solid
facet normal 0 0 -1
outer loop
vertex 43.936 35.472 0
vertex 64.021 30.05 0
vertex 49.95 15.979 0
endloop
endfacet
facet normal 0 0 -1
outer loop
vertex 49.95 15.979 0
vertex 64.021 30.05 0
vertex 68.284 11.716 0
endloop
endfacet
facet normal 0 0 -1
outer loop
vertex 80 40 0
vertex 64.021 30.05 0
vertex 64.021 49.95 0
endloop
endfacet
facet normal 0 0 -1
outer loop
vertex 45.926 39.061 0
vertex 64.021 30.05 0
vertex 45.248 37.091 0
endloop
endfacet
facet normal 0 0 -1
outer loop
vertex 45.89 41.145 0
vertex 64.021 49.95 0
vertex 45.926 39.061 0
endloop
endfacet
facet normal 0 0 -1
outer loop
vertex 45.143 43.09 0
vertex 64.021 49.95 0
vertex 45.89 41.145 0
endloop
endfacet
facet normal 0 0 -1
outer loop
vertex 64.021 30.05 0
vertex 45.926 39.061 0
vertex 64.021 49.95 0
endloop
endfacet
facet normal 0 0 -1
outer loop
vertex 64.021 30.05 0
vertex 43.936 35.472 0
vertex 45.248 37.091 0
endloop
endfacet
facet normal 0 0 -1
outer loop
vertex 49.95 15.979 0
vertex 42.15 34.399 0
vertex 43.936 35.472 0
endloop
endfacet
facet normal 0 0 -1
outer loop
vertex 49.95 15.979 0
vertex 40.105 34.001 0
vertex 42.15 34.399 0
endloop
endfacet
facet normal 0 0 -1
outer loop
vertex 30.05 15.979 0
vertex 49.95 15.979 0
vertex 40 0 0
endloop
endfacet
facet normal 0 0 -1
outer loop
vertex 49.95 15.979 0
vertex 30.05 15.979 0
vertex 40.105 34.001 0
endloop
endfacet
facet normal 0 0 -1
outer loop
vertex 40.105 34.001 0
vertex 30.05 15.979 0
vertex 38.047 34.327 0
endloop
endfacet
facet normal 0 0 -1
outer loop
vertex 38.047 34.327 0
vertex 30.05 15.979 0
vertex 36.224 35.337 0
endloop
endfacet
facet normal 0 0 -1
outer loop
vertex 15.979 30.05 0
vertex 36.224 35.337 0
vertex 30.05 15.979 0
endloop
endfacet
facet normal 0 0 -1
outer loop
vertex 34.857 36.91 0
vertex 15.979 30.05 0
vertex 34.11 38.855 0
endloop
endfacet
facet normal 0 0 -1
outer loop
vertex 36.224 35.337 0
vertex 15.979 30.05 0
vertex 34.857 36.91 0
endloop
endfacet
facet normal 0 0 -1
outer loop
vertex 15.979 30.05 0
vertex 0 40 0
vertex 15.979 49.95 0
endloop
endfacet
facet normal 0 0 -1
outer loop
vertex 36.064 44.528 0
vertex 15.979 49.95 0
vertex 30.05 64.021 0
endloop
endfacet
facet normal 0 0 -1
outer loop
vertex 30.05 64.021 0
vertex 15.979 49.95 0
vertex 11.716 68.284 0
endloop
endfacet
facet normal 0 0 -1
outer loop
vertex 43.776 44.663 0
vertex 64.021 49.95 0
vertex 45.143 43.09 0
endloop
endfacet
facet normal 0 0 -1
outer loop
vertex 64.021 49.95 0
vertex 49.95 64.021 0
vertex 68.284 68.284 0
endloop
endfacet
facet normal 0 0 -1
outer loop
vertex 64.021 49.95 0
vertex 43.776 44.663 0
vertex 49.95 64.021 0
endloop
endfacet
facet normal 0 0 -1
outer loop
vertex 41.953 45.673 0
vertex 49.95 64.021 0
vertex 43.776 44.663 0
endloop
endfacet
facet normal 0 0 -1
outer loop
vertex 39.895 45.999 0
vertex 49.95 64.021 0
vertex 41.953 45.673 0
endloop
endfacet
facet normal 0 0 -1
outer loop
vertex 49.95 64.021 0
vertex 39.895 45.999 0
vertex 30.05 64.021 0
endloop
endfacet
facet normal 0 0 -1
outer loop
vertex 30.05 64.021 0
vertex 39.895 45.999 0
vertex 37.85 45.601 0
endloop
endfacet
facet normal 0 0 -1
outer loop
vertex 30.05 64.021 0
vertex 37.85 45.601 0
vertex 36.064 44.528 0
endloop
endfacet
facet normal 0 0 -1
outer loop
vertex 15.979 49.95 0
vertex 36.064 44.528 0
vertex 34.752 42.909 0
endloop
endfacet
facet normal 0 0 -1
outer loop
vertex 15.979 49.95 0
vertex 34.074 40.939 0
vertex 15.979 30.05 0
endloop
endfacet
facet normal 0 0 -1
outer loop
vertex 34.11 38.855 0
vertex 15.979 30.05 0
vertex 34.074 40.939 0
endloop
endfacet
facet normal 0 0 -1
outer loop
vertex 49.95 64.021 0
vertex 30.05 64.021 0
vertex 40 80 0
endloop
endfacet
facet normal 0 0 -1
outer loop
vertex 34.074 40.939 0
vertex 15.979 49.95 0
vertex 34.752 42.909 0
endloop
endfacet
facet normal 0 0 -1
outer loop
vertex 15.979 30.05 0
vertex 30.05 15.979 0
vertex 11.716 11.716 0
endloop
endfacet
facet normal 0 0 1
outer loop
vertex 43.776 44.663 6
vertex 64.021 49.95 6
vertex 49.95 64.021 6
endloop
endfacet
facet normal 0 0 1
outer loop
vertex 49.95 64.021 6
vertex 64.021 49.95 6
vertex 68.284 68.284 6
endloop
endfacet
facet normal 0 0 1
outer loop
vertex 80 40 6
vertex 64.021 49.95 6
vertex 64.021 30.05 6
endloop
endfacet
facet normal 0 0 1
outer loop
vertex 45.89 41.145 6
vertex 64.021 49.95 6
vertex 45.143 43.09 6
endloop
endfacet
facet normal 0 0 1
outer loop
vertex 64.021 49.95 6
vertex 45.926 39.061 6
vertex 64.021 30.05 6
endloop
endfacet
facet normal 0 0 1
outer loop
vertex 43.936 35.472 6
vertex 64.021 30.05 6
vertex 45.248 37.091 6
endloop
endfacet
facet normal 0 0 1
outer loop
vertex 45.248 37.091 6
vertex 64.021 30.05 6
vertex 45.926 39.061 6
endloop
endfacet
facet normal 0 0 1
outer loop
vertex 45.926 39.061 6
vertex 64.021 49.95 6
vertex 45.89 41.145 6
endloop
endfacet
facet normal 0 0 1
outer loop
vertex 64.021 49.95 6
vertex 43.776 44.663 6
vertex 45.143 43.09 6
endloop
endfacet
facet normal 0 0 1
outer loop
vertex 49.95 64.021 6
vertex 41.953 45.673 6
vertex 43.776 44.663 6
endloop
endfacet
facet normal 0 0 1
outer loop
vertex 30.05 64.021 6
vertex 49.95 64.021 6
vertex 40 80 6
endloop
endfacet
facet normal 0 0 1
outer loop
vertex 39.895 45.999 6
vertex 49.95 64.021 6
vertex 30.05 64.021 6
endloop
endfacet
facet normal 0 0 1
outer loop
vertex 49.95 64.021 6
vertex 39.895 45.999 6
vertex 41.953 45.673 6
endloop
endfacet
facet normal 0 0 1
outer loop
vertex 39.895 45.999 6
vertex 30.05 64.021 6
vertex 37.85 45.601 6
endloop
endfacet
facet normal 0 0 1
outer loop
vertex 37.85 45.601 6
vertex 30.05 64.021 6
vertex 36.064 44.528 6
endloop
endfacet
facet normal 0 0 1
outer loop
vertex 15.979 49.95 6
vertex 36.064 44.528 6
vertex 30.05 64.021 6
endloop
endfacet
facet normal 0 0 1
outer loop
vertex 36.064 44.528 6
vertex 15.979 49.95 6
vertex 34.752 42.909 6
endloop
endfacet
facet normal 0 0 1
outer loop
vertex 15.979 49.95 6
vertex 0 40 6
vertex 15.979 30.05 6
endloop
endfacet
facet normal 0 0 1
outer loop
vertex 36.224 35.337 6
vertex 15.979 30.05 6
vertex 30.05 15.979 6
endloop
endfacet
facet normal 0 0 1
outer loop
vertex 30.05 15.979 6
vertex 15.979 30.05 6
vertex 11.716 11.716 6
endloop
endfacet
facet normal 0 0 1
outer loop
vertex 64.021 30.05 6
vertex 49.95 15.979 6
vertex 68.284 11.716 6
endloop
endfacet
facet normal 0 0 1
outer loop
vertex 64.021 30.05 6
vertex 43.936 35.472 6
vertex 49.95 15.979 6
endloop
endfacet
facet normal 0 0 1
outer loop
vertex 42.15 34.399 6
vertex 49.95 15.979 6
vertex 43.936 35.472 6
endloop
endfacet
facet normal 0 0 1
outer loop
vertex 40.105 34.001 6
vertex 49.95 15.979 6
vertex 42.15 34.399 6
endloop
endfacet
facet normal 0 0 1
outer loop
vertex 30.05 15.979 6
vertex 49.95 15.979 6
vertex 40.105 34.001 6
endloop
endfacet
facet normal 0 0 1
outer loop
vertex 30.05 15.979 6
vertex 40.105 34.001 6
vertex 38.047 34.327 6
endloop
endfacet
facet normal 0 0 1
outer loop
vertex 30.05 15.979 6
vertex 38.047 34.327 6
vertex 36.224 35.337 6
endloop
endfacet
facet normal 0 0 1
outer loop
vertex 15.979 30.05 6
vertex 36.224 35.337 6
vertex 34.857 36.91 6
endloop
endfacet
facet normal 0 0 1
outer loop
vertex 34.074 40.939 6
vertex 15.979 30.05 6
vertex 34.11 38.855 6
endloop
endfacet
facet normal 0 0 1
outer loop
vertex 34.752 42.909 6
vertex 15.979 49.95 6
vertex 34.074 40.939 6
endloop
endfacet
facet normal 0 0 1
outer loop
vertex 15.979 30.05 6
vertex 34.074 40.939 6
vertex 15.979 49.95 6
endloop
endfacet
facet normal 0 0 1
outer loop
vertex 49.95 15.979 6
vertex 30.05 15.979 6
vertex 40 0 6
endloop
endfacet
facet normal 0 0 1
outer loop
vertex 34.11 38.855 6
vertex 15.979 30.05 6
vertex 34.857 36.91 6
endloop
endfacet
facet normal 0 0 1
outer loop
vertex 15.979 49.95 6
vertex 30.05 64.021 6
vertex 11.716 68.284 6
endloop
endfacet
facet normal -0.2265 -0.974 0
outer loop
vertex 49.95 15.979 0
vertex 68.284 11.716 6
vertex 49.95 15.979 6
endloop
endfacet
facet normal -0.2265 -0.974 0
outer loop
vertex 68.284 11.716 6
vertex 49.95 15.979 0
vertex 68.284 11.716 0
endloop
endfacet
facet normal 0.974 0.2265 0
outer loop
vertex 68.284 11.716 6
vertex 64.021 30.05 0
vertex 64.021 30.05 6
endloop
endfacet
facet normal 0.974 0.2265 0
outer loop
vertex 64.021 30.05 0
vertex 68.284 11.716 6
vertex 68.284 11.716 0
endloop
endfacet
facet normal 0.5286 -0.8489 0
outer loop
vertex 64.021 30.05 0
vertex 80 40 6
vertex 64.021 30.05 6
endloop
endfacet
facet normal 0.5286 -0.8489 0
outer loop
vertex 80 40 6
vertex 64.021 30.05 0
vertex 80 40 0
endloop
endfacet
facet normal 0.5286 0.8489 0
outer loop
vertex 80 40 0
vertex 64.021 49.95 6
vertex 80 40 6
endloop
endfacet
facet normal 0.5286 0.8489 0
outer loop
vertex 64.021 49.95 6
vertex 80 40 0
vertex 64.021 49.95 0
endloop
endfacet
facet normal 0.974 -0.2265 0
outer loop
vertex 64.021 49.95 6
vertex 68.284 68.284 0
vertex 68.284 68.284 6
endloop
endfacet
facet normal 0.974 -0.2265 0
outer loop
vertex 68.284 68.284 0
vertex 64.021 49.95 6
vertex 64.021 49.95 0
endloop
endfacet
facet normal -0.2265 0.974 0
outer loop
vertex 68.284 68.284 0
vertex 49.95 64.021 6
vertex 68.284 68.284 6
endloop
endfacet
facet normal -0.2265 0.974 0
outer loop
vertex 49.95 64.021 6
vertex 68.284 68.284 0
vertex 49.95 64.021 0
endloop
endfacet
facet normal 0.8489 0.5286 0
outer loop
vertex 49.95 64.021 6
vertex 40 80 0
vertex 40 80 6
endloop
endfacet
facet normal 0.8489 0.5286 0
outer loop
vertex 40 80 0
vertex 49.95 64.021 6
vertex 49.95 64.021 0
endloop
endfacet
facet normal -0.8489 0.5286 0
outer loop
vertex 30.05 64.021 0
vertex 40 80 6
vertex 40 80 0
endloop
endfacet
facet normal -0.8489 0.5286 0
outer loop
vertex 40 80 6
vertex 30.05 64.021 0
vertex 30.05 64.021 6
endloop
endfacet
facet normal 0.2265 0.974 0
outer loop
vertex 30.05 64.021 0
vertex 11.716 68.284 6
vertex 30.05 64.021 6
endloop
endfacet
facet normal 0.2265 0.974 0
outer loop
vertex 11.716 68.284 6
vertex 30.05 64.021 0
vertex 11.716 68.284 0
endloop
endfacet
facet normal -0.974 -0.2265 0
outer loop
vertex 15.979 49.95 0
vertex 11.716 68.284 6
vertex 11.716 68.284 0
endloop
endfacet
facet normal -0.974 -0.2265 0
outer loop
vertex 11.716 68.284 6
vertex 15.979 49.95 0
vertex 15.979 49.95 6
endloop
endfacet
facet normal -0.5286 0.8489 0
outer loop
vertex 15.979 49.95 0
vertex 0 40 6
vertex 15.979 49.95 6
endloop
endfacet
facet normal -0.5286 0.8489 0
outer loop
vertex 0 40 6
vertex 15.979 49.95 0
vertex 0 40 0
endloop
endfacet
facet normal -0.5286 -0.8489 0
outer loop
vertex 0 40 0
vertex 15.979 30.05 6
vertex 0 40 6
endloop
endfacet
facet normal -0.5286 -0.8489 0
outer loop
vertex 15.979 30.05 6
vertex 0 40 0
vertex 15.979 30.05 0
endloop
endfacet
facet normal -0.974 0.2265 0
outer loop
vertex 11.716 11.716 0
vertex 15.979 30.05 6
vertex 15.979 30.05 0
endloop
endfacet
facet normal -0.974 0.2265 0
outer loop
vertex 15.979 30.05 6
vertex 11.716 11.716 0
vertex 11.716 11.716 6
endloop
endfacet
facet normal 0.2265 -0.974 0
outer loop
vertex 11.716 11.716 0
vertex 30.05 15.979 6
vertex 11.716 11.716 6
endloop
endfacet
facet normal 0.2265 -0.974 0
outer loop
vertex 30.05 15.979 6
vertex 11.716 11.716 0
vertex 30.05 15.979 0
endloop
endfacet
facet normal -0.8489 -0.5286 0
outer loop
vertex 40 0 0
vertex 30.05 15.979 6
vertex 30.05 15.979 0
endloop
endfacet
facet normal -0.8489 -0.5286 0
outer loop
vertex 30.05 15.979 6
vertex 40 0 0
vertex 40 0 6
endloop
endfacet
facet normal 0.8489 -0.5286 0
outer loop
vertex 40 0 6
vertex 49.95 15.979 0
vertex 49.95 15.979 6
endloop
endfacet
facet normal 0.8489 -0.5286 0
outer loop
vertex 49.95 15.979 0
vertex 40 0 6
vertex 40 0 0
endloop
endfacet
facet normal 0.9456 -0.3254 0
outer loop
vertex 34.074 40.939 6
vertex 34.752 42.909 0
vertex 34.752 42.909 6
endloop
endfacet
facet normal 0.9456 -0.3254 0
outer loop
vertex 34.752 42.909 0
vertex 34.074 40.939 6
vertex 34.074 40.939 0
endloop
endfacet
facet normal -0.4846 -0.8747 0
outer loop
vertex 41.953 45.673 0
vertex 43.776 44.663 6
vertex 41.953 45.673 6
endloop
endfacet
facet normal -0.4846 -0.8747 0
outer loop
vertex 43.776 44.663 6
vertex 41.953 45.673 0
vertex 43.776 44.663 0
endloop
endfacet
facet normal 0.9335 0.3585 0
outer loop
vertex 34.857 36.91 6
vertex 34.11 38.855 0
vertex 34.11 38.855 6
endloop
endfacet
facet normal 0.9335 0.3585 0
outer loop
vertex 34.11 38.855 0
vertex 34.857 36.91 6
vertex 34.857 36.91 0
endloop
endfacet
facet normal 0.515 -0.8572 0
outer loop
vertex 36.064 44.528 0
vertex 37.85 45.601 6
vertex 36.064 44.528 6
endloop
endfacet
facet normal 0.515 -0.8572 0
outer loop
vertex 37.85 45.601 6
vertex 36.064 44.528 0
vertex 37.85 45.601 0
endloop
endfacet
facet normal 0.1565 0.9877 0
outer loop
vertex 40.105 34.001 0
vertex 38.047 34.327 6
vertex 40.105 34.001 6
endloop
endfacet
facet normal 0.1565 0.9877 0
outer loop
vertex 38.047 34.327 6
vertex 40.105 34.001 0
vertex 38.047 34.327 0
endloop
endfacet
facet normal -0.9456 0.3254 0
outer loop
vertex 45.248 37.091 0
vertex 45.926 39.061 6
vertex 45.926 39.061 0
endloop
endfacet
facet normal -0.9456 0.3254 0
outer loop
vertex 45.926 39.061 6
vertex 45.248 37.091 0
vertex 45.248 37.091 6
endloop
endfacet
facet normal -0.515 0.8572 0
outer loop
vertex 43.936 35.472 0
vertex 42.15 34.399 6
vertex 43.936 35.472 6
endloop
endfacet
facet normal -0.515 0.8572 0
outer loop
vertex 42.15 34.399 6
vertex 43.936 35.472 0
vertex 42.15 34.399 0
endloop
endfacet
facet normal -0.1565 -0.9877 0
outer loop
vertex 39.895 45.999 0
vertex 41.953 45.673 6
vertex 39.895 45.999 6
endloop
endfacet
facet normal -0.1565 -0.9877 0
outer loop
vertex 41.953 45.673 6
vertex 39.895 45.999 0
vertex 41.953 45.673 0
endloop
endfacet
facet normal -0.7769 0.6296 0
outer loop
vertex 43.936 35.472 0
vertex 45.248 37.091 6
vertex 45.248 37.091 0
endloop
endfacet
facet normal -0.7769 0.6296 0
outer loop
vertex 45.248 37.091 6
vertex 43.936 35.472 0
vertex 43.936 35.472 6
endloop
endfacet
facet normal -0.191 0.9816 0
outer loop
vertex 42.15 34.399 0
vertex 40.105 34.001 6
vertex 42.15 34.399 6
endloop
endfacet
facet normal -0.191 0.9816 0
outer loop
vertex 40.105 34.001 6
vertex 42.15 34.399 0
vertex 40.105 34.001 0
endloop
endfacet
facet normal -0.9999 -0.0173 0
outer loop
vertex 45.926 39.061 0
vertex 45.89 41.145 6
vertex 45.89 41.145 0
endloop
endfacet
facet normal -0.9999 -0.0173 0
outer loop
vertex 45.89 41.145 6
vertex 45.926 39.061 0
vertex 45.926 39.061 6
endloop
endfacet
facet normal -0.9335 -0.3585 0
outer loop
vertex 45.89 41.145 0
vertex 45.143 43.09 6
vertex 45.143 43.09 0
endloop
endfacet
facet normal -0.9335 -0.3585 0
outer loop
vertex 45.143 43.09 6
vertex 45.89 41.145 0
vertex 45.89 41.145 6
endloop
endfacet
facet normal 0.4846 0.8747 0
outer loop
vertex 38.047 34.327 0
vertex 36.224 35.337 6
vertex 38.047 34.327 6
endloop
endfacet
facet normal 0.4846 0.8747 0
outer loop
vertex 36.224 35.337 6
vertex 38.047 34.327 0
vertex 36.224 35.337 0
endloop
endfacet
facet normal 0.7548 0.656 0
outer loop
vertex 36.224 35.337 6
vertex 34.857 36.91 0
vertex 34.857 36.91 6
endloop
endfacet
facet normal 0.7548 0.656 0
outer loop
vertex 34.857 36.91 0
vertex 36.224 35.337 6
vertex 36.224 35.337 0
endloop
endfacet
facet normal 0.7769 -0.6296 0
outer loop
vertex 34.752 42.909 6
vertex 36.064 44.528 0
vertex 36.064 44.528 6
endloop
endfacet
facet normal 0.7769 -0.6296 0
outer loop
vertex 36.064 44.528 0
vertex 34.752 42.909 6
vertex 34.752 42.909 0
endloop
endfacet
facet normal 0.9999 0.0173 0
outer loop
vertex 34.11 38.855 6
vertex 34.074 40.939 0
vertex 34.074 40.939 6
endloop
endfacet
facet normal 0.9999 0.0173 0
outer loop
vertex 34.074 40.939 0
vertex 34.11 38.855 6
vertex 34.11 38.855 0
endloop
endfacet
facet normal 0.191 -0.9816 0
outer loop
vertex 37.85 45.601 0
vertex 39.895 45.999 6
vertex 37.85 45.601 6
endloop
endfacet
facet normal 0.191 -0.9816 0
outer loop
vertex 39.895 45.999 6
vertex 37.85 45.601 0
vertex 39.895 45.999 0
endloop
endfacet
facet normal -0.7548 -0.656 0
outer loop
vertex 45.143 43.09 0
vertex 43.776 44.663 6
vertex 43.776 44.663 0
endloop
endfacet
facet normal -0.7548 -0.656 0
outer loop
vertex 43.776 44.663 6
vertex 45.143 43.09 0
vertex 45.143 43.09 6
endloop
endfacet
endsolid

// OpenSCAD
$fn = 32;

// ----------------------------------------------------------------------
// Star wheel: 8-point blunt, R40
// ----------------------------------------------------------------------

// --- parameters (mm) ---
n_points = 8;             // number of points / teeth
r_out = 40;               // tip radius
r_in = 26;                // root radius
bore_r = 6;               // centre bore radius
plate_t = 6;              // plate thickness, Z (extrusion height)
bore_d = 12;              // centre bore diameter

profile = [[40, 80], [30.05, 64.021], [11.716, 68.284], [15.979, 49.95], [0, 40], [15.979, 30.05], [11.716, 11.716], [30.05, 15.979], [40, 0], [49.95, 15.979], [68.284, 11.716], [64.021, 30.05], [80, 40], [64.021, 49.95], [68.284, 68.284], [49.95, 64.021]];  // primary outline, 16 points, counter clockwise
void_1 = [[45.89, 41.145], [45.143, 43.09], [43.776, 44.663], [41.953, 45.673], [39.895, 45.999], [37.85, 45.601], [36.064, 44.528], [34.752, 42.909], [34.074, 40.939], [34.11, 38.855], [34.857, 36.91], [36.224, 35.337], [38.047, 34.327], [40.105, 34.001], [42.15, 34.399], [43.936, 35.472], [45.248, 37.091], [45.926, 39.061]];  // centre bore, 18 points

// --- the one profile operation ---
difference() {
  linear_extrude(height = plate_t) polygon(points = profile);
  translate([0, 0, -1])
    linear_extrude(height = plate_t + 2) polygon(points = void_1);
}
